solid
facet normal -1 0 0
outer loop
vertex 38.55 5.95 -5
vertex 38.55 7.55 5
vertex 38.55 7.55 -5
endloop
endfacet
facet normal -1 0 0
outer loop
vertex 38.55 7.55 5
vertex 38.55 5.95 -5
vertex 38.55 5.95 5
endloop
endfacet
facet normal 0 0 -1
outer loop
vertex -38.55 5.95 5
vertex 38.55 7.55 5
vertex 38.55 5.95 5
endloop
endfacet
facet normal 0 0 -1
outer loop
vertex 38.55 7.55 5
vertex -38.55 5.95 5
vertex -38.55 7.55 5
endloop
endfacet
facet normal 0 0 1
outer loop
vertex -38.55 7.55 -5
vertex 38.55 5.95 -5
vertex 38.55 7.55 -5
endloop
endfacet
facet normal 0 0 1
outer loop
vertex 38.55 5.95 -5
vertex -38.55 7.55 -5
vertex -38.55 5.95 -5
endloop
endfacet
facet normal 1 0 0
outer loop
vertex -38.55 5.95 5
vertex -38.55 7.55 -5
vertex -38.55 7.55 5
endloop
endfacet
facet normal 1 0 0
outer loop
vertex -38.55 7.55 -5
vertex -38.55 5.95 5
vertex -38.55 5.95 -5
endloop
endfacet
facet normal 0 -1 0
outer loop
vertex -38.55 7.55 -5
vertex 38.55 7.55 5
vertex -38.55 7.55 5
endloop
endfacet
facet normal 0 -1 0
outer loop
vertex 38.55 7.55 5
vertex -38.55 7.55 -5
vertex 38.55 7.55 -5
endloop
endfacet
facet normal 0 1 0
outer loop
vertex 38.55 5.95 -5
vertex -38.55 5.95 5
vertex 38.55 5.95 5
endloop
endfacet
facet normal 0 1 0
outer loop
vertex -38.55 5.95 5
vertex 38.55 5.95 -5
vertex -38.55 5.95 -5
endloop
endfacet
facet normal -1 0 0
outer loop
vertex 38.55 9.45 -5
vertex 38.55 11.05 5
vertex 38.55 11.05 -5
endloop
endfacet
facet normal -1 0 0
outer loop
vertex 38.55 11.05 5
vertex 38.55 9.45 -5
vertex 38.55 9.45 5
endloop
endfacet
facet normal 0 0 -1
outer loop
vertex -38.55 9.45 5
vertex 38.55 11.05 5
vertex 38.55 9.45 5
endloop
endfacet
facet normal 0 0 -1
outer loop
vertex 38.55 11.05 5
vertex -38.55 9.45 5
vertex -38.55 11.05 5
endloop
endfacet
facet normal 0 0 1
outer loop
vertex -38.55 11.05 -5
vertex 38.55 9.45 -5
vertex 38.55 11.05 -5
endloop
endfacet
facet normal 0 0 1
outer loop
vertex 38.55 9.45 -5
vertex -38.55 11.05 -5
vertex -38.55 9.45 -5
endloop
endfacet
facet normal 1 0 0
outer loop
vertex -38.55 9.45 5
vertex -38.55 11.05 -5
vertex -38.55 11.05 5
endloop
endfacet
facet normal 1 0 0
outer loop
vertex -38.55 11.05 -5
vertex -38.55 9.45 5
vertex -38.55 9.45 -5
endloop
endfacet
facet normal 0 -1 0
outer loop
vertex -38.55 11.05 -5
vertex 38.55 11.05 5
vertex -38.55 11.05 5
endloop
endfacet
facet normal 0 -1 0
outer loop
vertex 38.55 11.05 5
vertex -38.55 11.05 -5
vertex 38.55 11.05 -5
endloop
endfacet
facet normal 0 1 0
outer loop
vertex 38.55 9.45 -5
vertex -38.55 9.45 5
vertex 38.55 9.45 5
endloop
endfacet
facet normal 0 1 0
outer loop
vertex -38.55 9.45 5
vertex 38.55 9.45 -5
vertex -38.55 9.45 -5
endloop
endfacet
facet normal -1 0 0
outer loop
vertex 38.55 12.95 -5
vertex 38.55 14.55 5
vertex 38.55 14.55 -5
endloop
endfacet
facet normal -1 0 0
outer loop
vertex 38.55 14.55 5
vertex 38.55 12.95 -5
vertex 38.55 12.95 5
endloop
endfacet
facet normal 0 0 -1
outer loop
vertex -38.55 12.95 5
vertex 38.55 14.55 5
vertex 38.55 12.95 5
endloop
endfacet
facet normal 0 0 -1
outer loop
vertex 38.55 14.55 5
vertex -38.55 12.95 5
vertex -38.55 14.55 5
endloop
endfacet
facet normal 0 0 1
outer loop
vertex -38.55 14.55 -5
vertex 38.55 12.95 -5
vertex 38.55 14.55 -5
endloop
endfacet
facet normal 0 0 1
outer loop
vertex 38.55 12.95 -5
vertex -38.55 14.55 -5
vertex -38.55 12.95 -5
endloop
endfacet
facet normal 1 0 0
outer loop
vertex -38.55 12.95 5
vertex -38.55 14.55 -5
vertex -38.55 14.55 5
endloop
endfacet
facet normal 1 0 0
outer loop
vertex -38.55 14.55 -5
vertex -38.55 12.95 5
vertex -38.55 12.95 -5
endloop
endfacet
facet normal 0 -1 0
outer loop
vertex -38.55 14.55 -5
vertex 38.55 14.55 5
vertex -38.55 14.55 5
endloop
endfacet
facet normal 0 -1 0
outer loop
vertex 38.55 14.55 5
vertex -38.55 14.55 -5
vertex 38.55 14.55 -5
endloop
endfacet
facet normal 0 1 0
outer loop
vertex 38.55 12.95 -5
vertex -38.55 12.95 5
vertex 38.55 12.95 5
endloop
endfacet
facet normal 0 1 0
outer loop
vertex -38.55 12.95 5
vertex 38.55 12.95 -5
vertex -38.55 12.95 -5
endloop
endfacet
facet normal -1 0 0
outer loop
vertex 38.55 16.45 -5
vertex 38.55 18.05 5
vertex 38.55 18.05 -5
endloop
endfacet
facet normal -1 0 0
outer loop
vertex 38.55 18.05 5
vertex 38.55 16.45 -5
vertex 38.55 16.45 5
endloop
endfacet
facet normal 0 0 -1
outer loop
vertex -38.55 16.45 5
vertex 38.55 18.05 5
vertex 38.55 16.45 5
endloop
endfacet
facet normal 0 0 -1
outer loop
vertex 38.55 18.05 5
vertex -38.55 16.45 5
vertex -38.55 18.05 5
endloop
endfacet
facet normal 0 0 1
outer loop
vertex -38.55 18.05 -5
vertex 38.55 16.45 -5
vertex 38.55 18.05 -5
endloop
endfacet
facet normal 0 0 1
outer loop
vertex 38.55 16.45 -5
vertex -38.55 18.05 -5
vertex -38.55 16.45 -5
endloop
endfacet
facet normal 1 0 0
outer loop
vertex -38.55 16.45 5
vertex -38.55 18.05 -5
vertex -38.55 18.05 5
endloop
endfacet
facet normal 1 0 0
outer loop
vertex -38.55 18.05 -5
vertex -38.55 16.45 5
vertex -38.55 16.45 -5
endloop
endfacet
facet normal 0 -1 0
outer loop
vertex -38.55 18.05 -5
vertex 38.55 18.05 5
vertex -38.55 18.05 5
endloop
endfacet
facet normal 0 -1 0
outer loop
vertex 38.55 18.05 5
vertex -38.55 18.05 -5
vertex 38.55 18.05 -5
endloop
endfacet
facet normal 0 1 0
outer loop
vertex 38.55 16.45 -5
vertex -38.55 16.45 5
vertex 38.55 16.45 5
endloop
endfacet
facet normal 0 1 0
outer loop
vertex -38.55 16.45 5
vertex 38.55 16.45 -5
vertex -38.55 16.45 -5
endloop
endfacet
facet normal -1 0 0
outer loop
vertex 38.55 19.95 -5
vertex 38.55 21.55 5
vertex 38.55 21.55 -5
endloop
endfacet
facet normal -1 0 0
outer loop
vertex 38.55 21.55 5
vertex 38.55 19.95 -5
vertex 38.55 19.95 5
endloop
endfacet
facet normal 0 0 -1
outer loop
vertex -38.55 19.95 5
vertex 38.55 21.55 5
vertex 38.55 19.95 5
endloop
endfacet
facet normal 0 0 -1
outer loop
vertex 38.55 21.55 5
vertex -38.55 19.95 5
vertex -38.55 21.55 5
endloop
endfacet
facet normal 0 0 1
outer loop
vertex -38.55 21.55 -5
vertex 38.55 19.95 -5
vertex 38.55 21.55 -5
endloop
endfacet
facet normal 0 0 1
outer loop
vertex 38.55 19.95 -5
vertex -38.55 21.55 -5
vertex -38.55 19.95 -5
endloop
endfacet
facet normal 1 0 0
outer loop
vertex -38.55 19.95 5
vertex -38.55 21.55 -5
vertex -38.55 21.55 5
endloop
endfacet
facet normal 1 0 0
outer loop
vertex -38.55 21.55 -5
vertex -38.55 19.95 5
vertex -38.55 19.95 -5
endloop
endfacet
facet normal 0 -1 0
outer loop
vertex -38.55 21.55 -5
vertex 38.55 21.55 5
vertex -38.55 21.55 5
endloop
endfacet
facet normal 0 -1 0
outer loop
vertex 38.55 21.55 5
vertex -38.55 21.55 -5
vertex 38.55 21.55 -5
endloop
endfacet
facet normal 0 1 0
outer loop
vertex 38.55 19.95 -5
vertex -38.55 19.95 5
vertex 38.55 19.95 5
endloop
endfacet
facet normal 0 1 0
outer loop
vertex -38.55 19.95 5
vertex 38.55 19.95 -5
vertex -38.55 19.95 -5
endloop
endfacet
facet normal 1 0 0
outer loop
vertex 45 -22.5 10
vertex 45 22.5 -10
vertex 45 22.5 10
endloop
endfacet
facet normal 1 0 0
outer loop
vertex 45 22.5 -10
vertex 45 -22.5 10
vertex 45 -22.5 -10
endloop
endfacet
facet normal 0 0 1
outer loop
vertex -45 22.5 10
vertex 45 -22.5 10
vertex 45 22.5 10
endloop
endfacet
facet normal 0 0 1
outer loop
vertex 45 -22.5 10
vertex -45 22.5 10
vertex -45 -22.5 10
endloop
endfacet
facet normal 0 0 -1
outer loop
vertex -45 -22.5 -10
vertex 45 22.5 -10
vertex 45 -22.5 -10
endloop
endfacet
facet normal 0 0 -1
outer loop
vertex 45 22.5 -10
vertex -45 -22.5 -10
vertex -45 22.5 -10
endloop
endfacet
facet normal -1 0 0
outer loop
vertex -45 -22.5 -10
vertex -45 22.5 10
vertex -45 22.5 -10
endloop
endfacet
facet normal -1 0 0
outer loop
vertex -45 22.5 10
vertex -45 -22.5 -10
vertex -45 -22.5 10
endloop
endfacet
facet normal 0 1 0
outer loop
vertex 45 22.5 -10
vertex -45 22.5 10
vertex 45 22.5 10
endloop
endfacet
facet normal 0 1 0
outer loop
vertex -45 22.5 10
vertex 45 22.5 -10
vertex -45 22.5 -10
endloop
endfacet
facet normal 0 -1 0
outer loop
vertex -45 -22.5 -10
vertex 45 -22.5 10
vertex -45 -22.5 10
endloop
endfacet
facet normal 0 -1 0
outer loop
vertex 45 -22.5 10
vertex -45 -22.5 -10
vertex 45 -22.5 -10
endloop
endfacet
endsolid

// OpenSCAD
// Drying Rack for 10 Microscope Slides
// Base: 90 x 45 x 20 mm
// Slots: 10 parallel slots along X, 77mm long, 1.6mm wide, 10mm deep
// Spacing: 3.5mm centre-to-centre in Y

$fn = 128;

// Base Dimensions
base_length = 90;
base_width = 45;
base_height = 20;

// Slide Dimensions (for reference)
slide_length = 75;
slide_width = 25;
slide_thickness = 1;

// Slot Dimensions
num_slots = 10;
slot_length = 77;
slot_width = 1.6;
slot_depth = 10;
slot_spacing = 3.5; // Centre-to-centre in Y

// Calculate Y position of the first slot centre
// The group of slots is centred on the block in Y.
// Total span of slots = (num_slots - 1) * slot_spacing
// Offset from block edge = (base_width - total_span) / 2
total_span = (num_slots - 1) * slot_spacing;
y_offset = (base_width - total_span) / 2;

// Build the solid base block
difference() {
    // Main block
    cube([base_length, base_width, base_height], center = true);
    
    // Cut the 10 slots
    // Slots run along X, so we cut along the X axis.
    // We need to ensure the cut extends slightly past the slot length to avoid coplanar faces.
    cut_extension = 0.1; 
    
    for (i = [0 : num_slots - 1]) {
        // Calculate Y position for this specific slot
        y_pos = y_offset + i * slot_spacing;
        
        // Define the slot geometry
        // The slot is a rectangular prism cut into the top face.
        // It runs along X, has width in Y, and depth in Z.
        
        translate([0, y_pos, 0]) {
            // Cut shape: extends slightly beyond slot_length in X to ensure clean cut
            // Width is slot_width in Y
            // Depth is slot_depth in Z
            cube([slot_length + cut_extension, slot_width, slot_depth], center = true);
        }
    }
}
